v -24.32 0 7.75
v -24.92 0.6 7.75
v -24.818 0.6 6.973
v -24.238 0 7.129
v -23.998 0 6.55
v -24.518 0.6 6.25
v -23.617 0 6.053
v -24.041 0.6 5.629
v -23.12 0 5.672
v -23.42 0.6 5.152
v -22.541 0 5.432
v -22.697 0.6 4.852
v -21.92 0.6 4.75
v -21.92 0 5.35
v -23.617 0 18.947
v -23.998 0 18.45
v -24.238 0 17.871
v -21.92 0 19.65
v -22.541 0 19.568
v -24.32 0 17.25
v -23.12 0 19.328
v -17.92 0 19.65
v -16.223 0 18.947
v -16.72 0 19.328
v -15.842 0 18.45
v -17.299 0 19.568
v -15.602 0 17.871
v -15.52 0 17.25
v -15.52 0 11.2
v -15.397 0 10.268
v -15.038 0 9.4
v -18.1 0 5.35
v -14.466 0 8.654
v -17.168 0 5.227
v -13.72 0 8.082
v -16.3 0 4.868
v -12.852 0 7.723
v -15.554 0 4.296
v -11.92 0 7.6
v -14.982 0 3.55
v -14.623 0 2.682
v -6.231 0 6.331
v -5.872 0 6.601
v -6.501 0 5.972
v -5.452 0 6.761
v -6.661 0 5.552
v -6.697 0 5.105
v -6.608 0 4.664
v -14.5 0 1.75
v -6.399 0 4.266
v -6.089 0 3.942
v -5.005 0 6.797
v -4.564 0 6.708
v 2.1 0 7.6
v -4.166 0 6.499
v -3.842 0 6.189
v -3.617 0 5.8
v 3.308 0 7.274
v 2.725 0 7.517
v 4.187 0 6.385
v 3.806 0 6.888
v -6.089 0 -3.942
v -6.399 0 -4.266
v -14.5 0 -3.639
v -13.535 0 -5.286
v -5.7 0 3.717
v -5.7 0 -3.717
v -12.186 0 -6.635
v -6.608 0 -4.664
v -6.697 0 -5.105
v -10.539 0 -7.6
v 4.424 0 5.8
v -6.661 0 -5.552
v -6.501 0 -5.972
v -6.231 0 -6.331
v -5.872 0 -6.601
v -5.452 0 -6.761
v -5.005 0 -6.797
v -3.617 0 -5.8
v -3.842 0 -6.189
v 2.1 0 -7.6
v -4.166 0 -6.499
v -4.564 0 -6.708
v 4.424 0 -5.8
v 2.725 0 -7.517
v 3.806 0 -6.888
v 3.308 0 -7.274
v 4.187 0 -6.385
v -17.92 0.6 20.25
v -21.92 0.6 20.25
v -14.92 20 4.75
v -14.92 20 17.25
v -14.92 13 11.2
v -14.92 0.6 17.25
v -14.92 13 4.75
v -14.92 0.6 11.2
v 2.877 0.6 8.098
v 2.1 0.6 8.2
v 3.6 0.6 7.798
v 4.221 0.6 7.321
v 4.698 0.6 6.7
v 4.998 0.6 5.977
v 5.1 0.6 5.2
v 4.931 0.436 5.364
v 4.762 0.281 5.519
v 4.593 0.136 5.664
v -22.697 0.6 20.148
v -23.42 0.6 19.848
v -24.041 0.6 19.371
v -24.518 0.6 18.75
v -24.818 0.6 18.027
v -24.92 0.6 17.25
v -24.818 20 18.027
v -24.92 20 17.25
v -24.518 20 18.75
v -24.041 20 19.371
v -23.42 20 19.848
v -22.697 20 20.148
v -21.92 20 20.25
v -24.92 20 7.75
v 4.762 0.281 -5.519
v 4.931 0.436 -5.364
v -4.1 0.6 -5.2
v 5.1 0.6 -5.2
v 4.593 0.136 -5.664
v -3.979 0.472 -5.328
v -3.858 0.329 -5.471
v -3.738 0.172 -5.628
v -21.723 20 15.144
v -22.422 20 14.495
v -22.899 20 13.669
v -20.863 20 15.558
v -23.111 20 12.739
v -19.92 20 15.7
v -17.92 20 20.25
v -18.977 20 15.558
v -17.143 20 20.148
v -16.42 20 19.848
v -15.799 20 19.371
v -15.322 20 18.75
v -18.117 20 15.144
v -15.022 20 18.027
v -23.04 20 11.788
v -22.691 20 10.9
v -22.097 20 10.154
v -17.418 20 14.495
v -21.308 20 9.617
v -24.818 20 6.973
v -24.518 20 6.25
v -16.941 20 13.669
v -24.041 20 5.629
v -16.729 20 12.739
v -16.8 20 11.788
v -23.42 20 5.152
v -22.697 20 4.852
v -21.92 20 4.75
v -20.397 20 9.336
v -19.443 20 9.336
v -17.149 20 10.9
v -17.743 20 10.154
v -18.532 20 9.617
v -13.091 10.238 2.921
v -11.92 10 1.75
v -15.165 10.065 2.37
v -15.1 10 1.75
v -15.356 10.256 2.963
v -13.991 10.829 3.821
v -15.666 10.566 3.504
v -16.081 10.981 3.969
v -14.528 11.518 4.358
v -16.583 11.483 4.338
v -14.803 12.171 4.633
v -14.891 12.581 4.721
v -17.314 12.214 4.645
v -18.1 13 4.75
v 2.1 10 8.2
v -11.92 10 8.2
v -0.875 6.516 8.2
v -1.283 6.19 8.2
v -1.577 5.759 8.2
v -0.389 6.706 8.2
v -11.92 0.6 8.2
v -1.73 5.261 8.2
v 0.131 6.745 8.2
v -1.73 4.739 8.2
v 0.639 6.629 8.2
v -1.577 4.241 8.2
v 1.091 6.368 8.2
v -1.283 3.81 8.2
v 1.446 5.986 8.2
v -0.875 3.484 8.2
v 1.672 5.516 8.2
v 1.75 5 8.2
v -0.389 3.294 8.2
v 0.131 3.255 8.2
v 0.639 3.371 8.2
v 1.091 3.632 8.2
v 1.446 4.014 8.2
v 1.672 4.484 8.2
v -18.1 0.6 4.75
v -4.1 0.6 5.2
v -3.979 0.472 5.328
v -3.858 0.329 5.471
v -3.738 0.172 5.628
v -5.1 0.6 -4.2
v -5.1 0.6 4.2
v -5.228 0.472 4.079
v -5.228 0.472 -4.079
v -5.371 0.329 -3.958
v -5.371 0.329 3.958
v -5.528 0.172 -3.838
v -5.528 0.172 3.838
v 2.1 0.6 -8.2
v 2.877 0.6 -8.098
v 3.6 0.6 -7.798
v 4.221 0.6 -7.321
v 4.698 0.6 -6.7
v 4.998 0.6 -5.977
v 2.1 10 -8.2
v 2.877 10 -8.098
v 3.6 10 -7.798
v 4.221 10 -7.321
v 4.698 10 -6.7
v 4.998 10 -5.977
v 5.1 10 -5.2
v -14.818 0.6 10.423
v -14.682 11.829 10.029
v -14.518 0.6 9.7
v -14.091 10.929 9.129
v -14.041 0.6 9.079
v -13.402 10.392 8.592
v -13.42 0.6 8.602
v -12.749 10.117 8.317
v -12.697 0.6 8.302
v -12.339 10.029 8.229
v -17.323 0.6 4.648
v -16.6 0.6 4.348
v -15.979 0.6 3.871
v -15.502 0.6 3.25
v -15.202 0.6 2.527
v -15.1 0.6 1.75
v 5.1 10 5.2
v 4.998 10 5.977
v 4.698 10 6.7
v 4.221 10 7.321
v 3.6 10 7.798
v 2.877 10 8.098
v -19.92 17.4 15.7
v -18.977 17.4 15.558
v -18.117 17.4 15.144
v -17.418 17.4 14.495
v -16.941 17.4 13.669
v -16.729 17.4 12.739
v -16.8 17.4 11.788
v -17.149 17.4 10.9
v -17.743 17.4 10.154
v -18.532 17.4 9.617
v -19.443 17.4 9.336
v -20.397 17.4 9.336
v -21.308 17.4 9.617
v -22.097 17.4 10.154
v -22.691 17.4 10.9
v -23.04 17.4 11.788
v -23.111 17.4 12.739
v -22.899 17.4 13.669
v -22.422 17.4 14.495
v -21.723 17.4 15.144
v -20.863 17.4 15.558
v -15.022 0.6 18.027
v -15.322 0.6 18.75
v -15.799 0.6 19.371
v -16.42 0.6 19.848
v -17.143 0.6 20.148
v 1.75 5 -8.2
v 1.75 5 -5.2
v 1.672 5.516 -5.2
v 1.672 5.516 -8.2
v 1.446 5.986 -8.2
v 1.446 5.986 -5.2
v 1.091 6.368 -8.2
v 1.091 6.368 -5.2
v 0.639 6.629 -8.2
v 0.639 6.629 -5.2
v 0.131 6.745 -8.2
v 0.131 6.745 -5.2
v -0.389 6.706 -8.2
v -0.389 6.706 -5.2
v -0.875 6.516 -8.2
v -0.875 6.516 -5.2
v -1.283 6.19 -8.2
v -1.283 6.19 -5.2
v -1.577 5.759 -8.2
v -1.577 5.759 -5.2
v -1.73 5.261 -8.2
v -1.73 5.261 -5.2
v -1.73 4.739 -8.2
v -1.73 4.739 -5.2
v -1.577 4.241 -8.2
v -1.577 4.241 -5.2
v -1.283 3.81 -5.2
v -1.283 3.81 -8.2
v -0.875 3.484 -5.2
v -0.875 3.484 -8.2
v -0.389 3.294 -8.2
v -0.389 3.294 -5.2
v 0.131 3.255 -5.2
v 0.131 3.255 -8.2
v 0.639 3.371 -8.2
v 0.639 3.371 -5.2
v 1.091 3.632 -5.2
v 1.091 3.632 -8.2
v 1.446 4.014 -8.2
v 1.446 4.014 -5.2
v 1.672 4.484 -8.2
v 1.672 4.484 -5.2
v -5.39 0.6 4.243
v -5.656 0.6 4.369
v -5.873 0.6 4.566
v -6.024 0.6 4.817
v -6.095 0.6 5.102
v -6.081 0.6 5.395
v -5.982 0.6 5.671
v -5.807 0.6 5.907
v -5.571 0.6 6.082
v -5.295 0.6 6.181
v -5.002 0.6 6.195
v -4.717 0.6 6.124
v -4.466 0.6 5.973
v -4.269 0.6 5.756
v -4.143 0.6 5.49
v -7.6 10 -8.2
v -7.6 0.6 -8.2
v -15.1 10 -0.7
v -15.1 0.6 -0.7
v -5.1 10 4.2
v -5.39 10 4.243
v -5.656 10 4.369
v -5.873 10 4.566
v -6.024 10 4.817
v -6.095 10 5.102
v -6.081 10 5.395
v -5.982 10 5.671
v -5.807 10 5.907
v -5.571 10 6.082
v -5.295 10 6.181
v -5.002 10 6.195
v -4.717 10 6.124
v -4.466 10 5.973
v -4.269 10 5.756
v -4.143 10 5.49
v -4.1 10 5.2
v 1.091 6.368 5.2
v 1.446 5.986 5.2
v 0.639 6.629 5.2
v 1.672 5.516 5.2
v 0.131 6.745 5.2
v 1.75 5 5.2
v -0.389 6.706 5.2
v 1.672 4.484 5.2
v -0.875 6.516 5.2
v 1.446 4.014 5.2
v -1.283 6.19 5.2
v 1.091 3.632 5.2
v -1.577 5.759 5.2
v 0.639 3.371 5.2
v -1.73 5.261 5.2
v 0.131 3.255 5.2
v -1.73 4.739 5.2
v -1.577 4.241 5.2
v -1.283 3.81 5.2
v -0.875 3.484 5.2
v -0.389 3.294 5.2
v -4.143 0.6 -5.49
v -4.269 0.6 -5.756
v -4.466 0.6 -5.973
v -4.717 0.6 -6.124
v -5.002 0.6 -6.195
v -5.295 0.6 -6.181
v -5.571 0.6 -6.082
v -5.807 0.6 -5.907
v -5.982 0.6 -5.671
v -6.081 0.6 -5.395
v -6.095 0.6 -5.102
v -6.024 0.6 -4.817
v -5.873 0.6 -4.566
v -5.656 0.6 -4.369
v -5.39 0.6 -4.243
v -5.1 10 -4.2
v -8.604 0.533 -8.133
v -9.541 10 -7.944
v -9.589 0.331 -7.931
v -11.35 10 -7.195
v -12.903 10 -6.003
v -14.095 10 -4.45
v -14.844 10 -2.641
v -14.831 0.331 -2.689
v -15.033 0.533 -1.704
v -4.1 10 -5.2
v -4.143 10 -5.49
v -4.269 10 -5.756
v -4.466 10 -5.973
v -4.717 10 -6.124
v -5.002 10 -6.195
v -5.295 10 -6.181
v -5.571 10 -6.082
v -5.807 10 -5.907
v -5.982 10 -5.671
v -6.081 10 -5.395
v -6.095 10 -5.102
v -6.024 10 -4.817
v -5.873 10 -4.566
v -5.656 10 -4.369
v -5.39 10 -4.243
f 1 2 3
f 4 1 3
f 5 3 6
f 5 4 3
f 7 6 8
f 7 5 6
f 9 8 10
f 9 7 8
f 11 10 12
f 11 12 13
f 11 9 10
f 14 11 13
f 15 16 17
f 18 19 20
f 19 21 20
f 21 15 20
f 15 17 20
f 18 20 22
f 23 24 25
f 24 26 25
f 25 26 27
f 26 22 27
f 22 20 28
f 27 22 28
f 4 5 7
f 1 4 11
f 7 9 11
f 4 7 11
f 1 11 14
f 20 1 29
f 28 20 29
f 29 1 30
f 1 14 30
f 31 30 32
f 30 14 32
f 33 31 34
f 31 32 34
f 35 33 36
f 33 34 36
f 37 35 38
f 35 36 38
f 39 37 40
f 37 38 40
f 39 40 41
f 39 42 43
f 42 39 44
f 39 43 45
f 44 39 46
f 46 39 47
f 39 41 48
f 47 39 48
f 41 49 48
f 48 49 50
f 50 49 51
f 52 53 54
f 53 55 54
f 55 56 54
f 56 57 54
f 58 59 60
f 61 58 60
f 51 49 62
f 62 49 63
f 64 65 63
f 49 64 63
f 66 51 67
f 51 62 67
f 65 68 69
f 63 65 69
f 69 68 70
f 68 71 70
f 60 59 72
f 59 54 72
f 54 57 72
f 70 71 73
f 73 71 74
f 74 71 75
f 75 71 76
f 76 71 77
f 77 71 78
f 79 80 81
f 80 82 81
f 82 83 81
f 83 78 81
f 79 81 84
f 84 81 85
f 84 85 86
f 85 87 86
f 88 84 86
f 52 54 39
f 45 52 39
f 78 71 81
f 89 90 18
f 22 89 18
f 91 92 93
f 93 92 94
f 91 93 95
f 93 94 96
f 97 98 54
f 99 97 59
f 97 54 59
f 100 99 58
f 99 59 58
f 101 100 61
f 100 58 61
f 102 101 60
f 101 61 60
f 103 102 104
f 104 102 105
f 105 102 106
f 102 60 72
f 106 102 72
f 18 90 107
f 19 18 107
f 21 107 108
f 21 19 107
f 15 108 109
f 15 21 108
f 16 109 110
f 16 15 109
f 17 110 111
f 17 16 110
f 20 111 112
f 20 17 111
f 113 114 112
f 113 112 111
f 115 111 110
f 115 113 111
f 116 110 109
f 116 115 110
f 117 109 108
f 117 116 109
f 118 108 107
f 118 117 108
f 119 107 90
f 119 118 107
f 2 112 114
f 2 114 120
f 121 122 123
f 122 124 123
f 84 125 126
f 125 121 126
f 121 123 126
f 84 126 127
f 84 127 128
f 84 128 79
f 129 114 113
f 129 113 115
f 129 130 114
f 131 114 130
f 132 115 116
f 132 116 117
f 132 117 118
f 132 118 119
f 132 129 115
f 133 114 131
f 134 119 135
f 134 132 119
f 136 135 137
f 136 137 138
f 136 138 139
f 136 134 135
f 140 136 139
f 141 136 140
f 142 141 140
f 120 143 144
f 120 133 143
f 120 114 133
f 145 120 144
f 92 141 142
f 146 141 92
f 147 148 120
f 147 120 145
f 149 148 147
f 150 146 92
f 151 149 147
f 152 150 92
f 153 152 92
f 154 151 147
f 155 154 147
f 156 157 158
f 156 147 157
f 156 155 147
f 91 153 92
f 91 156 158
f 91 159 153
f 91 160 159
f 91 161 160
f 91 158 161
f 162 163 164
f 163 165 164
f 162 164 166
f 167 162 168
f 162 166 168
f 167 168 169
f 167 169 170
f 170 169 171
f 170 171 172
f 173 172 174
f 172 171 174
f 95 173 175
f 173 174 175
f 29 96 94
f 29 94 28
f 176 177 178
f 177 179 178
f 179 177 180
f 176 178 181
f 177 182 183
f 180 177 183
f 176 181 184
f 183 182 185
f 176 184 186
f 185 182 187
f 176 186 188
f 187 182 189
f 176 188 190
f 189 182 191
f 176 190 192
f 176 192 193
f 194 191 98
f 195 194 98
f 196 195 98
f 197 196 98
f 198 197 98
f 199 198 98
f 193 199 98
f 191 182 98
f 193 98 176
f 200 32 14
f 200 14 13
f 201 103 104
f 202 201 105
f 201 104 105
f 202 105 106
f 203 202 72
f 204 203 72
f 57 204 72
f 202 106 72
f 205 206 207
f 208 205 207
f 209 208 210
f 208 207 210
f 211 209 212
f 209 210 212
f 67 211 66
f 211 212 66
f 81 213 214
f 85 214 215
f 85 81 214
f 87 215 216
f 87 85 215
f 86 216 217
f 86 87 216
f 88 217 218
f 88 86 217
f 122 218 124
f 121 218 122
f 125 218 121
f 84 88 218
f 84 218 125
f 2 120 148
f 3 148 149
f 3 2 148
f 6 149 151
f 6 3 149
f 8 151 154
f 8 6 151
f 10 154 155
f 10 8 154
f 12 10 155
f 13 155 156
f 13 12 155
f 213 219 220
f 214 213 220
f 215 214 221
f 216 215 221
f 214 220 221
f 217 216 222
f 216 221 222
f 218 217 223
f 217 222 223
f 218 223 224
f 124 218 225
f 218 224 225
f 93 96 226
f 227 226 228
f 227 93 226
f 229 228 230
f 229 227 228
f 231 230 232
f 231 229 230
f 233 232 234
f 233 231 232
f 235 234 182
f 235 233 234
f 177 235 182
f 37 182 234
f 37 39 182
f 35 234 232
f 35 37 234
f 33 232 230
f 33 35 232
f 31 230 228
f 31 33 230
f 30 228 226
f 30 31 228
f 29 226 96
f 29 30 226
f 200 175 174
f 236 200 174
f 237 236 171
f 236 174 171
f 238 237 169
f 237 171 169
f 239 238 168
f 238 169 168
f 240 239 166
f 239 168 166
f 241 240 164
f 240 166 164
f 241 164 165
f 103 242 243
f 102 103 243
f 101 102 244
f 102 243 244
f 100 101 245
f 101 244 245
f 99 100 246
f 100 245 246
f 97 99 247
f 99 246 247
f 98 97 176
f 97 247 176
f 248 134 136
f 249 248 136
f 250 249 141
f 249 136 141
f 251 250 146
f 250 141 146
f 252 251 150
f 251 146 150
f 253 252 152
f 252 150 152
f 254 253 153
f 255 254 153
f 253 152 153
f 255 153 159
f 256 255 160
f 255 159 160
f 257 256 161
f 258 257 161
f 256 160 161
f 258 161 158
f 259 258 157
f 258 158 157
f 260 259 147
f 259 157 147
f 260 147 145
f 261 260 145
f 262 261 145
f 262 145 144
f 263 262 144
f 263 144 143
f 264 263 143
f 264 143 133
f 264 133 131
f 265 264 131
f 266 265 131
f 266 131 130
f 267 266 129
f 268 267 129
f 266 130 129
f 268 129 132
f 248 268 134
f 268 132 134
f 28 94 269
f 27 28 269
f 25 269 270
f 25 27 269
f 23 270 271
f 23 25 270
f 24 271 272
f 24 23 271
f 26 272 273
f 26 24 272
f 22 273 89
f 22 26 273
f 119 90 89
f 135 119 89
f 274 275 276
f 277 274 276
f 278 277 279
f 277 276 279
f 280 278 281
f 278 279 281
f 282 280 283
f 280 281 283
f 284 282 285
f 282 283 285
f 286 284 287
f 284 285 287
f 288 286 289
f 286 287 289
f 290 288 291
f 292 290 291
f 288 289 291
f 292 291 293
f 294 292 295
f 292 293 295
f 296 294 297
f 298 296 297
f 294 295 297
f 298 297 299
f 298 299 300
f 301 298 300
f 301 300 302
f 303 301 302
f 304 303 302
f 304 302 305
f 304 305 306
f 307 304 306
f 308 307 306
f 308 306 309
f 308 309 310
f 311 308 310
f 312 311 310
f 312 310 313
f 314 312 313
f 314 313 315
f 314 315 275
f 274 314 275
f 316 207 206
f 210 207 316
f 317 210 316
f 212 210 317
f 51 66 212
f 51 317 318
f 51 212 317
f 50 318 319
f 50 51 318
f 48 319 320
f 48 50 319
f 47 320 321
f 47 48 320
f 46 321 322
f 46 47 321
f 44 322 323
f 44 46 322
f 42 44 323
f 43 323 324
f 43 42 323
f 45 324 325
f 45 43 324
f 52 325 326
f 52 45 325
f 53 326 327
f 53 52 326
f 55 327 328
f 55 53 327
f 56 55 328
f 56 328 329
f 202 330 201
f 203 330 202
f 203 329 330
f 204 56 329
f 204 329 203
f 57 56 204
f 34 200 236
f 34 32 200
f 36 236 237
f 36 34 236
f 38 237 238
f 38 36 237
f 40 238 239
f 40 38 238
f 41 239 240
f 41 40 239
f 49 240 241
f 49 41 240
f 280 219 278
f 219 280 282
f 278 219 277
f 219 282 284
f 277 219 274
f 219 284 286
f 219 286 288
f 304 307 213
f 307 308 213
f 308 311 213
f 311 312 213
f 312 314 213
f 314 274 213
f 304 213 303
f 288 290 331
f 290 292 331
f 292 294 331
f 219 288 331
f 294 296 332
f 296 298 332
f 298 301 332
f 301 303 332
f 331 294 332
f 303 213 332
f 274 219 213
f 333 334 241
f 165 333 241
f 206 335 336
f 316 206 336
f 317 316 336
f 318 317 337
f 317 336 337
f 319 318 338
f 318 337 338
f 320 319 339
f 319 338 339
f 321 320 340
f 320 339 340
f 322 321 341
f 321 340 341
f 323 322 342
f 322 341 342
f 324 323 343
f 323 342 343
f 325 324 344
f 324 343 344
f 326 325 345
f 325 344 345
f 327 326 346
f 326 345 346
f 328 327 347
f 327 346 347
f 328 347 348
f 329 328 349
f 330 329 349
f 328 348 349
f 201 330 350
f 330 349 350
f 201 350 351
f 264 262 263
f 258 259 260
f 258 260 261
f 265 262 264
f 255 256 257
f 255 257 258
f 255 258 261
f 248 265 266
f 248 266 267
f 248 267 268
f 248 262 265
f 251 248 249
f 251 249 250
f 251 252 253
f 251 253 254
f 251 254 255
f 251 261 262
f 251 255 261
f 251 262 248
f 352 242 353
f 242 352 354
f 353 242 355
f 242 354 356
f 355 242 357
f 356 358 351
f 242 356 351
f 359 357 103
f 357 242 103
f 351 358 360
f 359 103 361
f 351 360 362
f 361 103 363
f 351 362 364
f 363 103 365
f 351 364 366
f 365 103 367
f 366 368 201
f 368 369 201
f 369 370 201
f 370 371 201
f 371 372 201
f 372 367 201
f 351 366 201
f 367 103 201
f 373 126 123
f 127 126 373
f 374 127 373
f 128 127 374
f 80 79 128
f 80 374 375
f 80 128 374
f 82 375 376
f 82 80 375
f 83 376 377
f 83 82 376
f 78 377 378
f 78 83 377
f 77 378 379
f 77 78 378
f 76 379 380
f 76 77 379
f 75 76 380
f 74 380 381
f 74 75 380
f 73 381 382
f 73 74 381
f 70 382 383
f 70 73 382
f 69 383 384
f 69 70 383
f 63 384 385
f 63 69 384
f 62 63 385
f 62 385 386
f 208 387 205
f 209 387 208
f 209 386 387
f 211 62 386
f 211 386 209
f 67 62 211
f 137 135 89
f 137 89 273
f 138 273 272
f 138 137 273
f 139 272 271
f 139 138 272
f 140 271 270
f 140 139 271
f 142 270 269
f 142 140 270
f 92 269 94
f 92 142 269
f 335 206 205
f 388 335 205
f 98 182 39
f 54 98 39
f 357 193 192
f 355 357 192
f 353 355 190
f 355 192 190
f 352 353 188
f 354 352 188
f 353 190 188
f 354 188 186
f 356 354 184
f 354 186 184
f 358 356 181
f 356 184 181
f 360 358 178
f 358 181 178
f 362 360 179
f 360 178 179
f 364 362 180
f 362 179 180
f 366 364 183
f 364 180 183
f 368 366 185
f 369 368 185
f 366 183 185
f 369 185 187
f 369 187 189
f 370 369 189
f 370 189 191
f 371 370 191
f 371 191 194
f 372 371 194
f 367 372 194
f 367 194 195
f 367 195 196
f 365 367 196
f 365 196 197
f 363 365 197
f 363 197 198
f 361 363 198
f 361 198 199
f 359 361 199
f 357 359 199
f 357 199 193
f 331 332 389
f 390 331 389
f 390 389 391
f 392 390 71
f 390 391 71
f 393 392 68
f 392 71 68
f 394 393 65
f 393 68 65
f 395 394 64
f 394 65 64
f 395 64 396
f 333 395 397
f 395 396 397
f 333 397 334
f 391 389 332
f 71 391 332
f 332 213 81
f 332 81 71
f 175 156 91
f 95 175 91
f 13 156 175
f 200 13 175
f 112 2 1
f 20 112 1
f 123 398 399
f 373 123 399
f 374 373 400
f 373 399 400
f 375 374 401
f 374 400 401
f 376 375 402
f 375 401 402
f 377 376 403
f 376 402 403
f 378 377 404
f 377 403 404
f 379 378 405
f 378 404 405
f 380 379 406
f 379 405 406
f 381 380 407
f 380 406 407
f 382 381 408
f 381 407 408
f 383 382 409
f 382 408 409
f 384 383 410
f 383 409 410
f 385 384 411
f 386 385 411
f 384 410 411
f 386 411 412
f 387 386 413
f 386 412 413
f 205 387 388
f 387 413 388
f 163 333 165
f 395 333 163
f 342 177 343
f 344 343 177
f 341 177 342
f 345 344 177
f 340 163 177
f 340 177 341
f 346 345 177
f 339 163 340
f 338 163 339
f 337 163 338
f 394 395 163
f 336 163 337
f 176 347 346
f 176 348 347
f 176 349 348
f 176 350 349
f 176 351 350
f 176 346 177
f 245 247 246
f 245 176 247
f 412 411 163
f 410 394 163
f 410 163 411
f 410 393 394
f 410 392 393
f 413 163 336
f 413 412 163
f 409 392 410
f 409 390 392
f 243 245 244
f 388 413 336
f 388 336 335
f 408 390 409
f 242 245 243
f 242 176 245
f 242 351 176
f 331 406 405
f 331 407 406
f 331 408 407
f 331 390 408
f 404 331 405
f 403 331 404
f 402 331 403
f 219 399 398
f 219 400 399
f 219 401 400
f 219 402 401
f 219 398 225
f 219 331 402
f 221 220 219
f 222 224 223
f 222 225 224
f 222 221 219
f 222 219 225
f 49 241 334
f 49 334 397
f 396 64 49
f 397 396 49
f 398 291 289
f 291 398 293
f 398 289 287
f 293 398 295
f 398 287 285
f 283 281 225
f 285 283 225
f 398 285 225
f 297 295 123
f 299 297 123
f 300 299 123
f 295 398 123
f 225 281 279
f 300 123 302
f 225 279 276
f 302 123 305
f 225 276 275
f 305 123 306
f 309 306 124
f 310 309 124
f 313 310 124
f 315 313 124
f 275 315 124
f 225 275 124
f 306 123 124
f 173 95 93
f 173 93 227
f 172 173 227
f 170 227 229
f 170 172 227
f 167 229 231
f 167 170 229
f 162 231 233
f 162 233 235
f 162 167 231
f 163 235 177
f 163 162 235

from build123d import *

# Parameters (mm, degrees)
EXTRUDE_1_DEPTH     = 10
SKETCH_2_R          = 1.75
CUT_EXTRUDE_1_DEPTH = 32.463731502
SKETCH_3_W          = 10
SKETCH_3_H          = 15.5
EXTRUDE_2_DEPTH     = 10
SKETCH_4_R          = 3.2
CUT_EXTRUDE_2_DEPTH = 2.6
SKETCH_5_R          = 1
CUT_EXTRUDE_3_DEPTH = 34.631367799
FILLET_1_R          = 3
FILLET_2_R          = 3
CHAMFER_1_SIZE      = 0.6
FILLET_3_R          = 7.5


# Some blends are built 0.0001 mm under size
with BuildPart() as part:
    # ｽｹｯﾁ1 → ﾎﾞｽ - 押し出し1 (new body)
    with BuildSketch(Plane(origin=(0, 0, 0), x_dir=(1, 0, 0), z_dir=(0, 1, 0))):
        Polygon((-15.1, -8.2), (5.1, -8.2), (5.1, -5.2), (-5.1, -5.2), (-5.1, 5.2), (5.1, 5.2), (5.1, 8.2), (-15.1, 8.2), align=None)
        Polygon((-15.1, -8.2), (-15.1, -4.75), (-24.92, -4.75), (-24.92, -20.25), (-14.92, -20.25), (-14.92, -8.2), align=None)
    extrude(amount=EXTRUDE_1_DEPTH)

    # ｽｹｯﾁ2 → ｶｯﾄ - 押し出し1 (cut, through all)
    with BuildSketch(Plane.XY.offset(8.2)):
        with Locations((0, 5)):
            Circle(SKETCH_2_R)
    extrude(amount=-CUT_EXTRUDE_1_DEPTH, mode=Mode.SUBTRACT)

    # ｽｹｯﾁ3 → ﾎﾞｽ - 押し出し2 (add)
    with BuildSketch(Plane(origin=(0, 10, 0), x_dir=(1, 0, 0), z_dir=(0, 1, 0))):
        with Locations((-19.92, -12.5)):
            Rectangle(SKETCH_3_W, SKETCH_3_H)
    extrude(amount=EXTRUDE_2_DEPTH)

    # ｽｹｯﾁ4 → ｶｯﾄ - 押し出し2 (cut)
    with BuildSketch(Plane(origin=(0, 20, 0), x_dir=(1, 0, 0), z_dir=(0, 1, 0))):
        with Locations(Location((-19.92, -12.5, 0), (0, 0, 270))):
            Circle(SKETCH_4_R)
    extrude(amount=-CUT_EXTRUDE_2_DEPTH, mode=Mode.SUBTRACT)

    # ｽｹｯﾁ5 → ｶｯﾄ - 押し出し3 (cut, through all)
    with BuildSketch(Plane(origin=(0, 10, 0), x_dir=(1, 0, 0), z_dir=(0, 1, 0))):
        with Locations((-5.1, 5.2)):
            Circle(SKETCH_5_R)
        with Locations((-5.1, -5.2)):
            Circle(SKETCH_5_R)
    extrude(amount=-CUT_EXTRUDE_3_DEPTH, mode=Mode.SUBTRACT)

    # ﾌｨﾚｯﾄ1
    fillet_1_edges = [part.edges().sort_by_distance(p)[0] for p in [
        (-14.92, 10, 20.25),
        (-24.92, 10, 20.25),
        (-24.92, 10, 4.75),
        (-15.1, 5, 4.75),
        (5.1, 5, -8.2),
        (5.1, 5, 8.2),
        (-14.92, 10, 6.475),
        (-14.92, 5, 8.2),
    ]]
    fillet(fillet_1_edges, radius=FILLET_1_R - 0.0001)  # a hair under: the kernel refuses the full size

    # ﾌｨﾚｯﾄ2
    fillet_2_edges = [part.edges().sort_by_distance(p)[0] for p in [
        (-15.01, 10, 4.75),
    ]]
    fillet(fillet_2_edges, radius=FILLET_2_R - 0.0001)  # a hair under: the kernel refuses the full size

    # 面取り1
    # the kernel refuses this chamfer: 0.6 mm, written as the material it takes off along each edge
    with BuildSketch(Plane(origin=(-18.0999, 0, 1.7501), x_dir=(0, 0, 1), z_dir=(-1, 0, 0))) as chamfer_1_piece_1:
        Polygon((2.9999, CHAMFER_1_SIZE), (2.9999 + CHAMFER_1_SIZE, 0), (2.9999, 0), align=None)
    revolve(axis=Axis((-18.0999, 0, 1.7501), (0, 1, 0)), revolution_arc=90, mode=Mode.SUBTRACT)
    with BuildSketch(Plane(origin=(-11.9201, 0, 11.1999), x_dir=(0, 0, -1), z_dir=(1, 0, 0))) as chamfer_1_piece_2:
        Polygon((2.9999, CHAMFER_1_SIZE), (2.9999 + CHAMFER_1_SIZE, 0), (2.9999, 0), align=None)
    revolve(axis=Axis((-11.9201, 0, 11.1999), (0, 1, 0)), revolution_arc=90, mode=Mode.SUBTRACT)
    with BuildSketch(Plane(origin=(-15.1, 0, -9.743009793), x_dir=(-0.027495876610587354, 0.9996219169112968, 0), z_dir=(0, 0, 1))) as chamfer_1_piece_3:
        Polygon((CHAMFER_1_SIZE * 0.999621916911, -CHAMFER_1_SIZE * 0.0274958766106), (-CHAMFER_1_SIZE * 0.0274958766106, -CHAMFER_1_SIZE * 0.999621916911), (0, 0), align=None)
    extrude(amount=11.493109793, mode=Mode.SUBTRACT)
    with BuildSketch(Plane(origin=(-5.643009793, 0, -5.2), x_dir=(0, 0.9996219169112968, 0.027495876610585914), z_dir=(1, 0, 0)), Plane(origin=(6.643009793, 0, 5.2), x_dir=(0, 0.9996219169112968, -0.027495876610585914), z_dir=(-1, 0, 0))) as chamfer_1_piece_4:
        Polygon((CHAMFER_1_SIZE * 0.999621916911, -CHAMFER_1_SIZE * 0.0274958766106), (-CHAMFER_1_SIZE * 0.0274958766106, -CHAMFER_1_SIZE * 0.999621916911), (0, 0), align=None)
    extrude(amount=12.286019586, mode=Mode.SUBTRACT)
    with BuildSketch(Plane(origin=(-5.1, 0, 5.743009793), x_dir=(0.027495876610585914, 0.9996219169112968, 0), z_dir=(0, 0, -1))) as chamfer_1_piece_5:
        Polygon((CHAMFER_1_SIZE * 0.999621916911, -CHAMFER_1_SIZE * 0.0274958766106), (-CHAMFER_1_SIZE * 0.0274958766106, -CHAMFER_1_SIZE * 0.999621916911), (0, 0), align=None)
    extrude(amount=11.486019586, mode=Mode.SUBTRACT)
    with BuildSketch(Plane(origin=(-5.1, 0, 5.2), x_dir=(0.7048818539423609, 0, -0.7093247295722744), z_dir=(0.7093247295722744, 0, 0.7048818539423609))) as chamfer_1_piece_6:
        Polygon((1, CHAMFER_1_SIZE), (1 + CHAMFER_1_SIZE, 0), (1, 0), align=None)
    revolve(axis=Axis((-5.1, 0, 5.2), (0, 1, 0)), revolution_arc=359.64, mode=Mode.SUBTRACT)
    with BuildSketch(Plane(origin=(-5.1, 0, -5.2), x_dir=(0.7093247295722735, 0, 0.7048818539423618), z_dir=(-0.7048818539423618, 0, 0.7093247295722735))) as chamfer_1_piece_7:
        Polygon((1, CHAMFER_1_SIZE), (1 + CHAMFER_1_SIZE, 0), (1, 0), align=None)
    revolve(axis=Axis((-5.1, 0, -5.2), (0, 1, 0)), revolution_arc=359.64, mode=Mode.SUBTRACT)
    with BuildSketch(Plane(origin=(-14.92, 0, 17.2501), x_dir=(0.027495876610587354, 0.9996219169112968, 0), z_dir=(0, 0, -1))) as chamfer_1_piece_8:
        Polygon((CHAMFER_1_SIZE * 0.999621916911, -CHAMFER_1_SIZE * 0.0274958766106), (-CHAMFER_1_SIZE * 0.0274958766106, -CHAMFER_1_SIZE * 0.999621916911), (0, 0), align=None)
    extrude(amount=6.0502, mode=Mode.SUBTRACT)
    with BuildSketch(Plane(origin=(-11.9201, 0, 8.2), x_dir=(0, 0.9996219169112968, 0.027495876610587354), z_dir=(1, 0, 0))) as chamfer_1_piece_9:
        Polygon((CHAMFER_1_SIZE * 0.999621916911, -CHAMFER_1_SIZE * 0.0274958766106), (-CHAMFER_1_SIZE * 0.0274958766106, -CHAMFER_1_SIZE * 0.999621916911), (0, 0), align=None)
    extrude(amount=14.0202, mode=Mode.SUBTRACT)
    with BuildSketch(Plane(origin=(-21.9201, 0, 20.25), x_dir=(0, 0.9996219169112968, 0.027495876610584478), z_dir=(1, 0, 0))) as chamfer_1_piece_10:
        Polygon((CHAMFER_1_SIZE * 0.999621916911, -CHAMFER_1_SIZE * 0.0274958766106), (-CHAMFER_1_SIZE * 0.0274958766106, -CHAMFER_1_SIZE * 0.999621916911), (0, 0), align=None)
    extrude(amount=4.0002, mode=Mode.SUBTRACT)
    with BuildSketch(Plane(origin=(-24.92, 0, 7.7499), x_dir=(-0.027495876610584478, 0.9996219169112968, 0), z_dir=(0, 0, 1))) as chamfer_1_piece_11:
        Polygon((CHAMFER_1_SIZE * 0.999621916911, -CHAMFER_1_SIZE * 0.0274958766106), (-CHAMFER_1_SIZE * 0.0274958766106, -CHAMFER_1_SIZE * 0.999621916911), (0, 0), align=None)
    extrude(amount=9.5002, mode=Mode.SUBTRACT)
    with BuildSketch(Plane(origin=(-18.0999, 0, 4.75), x_dir=(0, -0.02749587661058641, 0.9996219169112968), z_dir=(-1, 0, 0))) as chamfer_1_piece_12:
        Polygon((CHAMFER_1_SIZE * 0.999621916911, CHAMFER_1_SIZE * 0.0274958766106), (-CHAMFER_1_SIZE * 0.0274958766106, CHAMFER_1_SIZE * 0.999621916911), (0, 0), align=None)
    extrude(amount=3.8202, mode=Mode.SUBTRACT)
    with BuildSketch(Plane(origin=(2.1001, 0, -8.2), x_dir=(0, 0.9996219169112968, -0.027495876610587354), z_dir=(-1, 0, 0))) as chamfer_1_piece_13:
        Polygon((CHAMFER_1_SIZE * 0.999621916911, -CHAMFER_1_SIZE * 0.0274958766106), (-CHAMFER_1_SIZE * 0.0274958766106, -CHAMFER_1_SIZE * 0.999621916911), (0, 0), align=None)
    extrude(amount=18.743109793, mode=Mode.SUBTRACT)
    with BuildSketch(Plane(origin=(2.1001, 0, 5.2001), x_dir=(0, 0, 1), z_dir=(-1, 0, 0))) as chamfer_1_piece_14:
        Polygon((2.9999, CHAMFER_1_SIZE), (2.9999 - CHAMFER_1_SIZE, 0), (2.9999, 0), align=None)
    revolve(axis=Axis((2.1001, 0, 5.2001), (0, 1, 0)), revolution_arc=90, mode=Mode.SUBTRACT)
    with BuildSketch(Plane(origin=(2.1001, 0, -5.2001), x_dir=(0, 0, -1), z_dir=(-1, 0, 0))) as chamfer_1_piece_15:
        Polygon((2.9999, -CHAMFER_1_SIZE), (2.9999 - CHAMFER_1_SIZE, 0), (2.9999, 0), align=None)
    revolve(axis=Axis((2.1001, 0, -5.2001), (0, -1, 0)), revolution_arc=90, mode=Mode.SUBTRACT)
    with BuildSketch(Plane(origin=(-21.9201, 0, 7.7499), x_dir=(-1, 0, 0), z_dir=(0, 0, 1))) as chamfer_1_piece_16:
        Polygon((2.9999, -CHAMFER_1_SIZE), (2.9999 - CHAMFER_1_SIZE, 0), (2.9999, 0), align=None)
    revolve(axis=Axis((-21.9201, 0, 7.7499), (0, -1, 0)), revolution_arc=90, mode=Mode.SUBTRACT)
    with BuildSketch(Plane(origin=(-21.9201, 0, 17.2501), x_dir=(0, 0, 1), z_dir=(1, 0, 0))) as chamfer_1_piece_17:
        Polygon((2.9999, -CHAMFER_1_SIZE), (2.9999 - CHAMFER_1_SIZE, 0), (2.9999, 0), align=None)
    revolve(axis=Axis((-21.9201, 0, 17.2501), (0, -1, 0)), revolution_arc=90, mode=Mode.SUBTRACT)
    with BuildSketch(Plane(origin=(-17.9199, 0, 17.2501), x_dir=(1, 0, 0), z_dir=(0, 0, -1))) as chamfer_1_piece_18:
        Polygon((2.9999, -CHAMFER_1_SIZE), (2.9999 - CHAMFER_1_SIZE, 0), (2.9999, 0), align=None)
    revolve(axis=Axis((-17.9199, 0, 17.2501), (0, -1, 0)), revolution_arc=90, mode=Mode.SUBTRACT)
    with BuildSketch(Plane(origin=(5.1, 0, -3.656990207), x_dir=(0.027495876610585918, 0.9996219169112968, 0), z_dir=(0, 0, -1)), Plane(origin=(5.1, 0, 5.2001), x_dir=(0.027495876610585918, 0.9996219169112968, 0), z_dir=(0, 0, -1))) as chamfer_1_piece_19:
        Polygon((CHAMFER_1_SIZE * 0.999621916911, -CHAMFER_1_SIZE * 0.0274958766106), (-CHAMFER_1_SIZE * 0.0274958766106, -CHAMFER_1_SIZE * 0.999621916911), (0, 0), align=None)
    extrude(amount=1.543109793, mode=Mode.SUBTRACT)

    # ﾌｨﾚｯﾄ3
    # the kernel refuses this fillet: 7.5 mm, written as the material it takes off along each edge
    with BuildSketch(Plane(origin=(-15.1, -18.15, -8.2), x_dir=(0, 0, 1), z_dir=(0, 1, 0))) as fillet_3_piece_1:
        with BuildLine():
            CenterArc((FILLET_3_R, FILLET_3_R), FILLET_3_R, 180, 90)
            Line((0, FILLET_3_R), (0, 0))
            Line((0, 0), (FILLET_3_R, 0))
        make_face()
    extrude(amount=46.9, mode=Mode.SUBTRACT)


solid = part.part
